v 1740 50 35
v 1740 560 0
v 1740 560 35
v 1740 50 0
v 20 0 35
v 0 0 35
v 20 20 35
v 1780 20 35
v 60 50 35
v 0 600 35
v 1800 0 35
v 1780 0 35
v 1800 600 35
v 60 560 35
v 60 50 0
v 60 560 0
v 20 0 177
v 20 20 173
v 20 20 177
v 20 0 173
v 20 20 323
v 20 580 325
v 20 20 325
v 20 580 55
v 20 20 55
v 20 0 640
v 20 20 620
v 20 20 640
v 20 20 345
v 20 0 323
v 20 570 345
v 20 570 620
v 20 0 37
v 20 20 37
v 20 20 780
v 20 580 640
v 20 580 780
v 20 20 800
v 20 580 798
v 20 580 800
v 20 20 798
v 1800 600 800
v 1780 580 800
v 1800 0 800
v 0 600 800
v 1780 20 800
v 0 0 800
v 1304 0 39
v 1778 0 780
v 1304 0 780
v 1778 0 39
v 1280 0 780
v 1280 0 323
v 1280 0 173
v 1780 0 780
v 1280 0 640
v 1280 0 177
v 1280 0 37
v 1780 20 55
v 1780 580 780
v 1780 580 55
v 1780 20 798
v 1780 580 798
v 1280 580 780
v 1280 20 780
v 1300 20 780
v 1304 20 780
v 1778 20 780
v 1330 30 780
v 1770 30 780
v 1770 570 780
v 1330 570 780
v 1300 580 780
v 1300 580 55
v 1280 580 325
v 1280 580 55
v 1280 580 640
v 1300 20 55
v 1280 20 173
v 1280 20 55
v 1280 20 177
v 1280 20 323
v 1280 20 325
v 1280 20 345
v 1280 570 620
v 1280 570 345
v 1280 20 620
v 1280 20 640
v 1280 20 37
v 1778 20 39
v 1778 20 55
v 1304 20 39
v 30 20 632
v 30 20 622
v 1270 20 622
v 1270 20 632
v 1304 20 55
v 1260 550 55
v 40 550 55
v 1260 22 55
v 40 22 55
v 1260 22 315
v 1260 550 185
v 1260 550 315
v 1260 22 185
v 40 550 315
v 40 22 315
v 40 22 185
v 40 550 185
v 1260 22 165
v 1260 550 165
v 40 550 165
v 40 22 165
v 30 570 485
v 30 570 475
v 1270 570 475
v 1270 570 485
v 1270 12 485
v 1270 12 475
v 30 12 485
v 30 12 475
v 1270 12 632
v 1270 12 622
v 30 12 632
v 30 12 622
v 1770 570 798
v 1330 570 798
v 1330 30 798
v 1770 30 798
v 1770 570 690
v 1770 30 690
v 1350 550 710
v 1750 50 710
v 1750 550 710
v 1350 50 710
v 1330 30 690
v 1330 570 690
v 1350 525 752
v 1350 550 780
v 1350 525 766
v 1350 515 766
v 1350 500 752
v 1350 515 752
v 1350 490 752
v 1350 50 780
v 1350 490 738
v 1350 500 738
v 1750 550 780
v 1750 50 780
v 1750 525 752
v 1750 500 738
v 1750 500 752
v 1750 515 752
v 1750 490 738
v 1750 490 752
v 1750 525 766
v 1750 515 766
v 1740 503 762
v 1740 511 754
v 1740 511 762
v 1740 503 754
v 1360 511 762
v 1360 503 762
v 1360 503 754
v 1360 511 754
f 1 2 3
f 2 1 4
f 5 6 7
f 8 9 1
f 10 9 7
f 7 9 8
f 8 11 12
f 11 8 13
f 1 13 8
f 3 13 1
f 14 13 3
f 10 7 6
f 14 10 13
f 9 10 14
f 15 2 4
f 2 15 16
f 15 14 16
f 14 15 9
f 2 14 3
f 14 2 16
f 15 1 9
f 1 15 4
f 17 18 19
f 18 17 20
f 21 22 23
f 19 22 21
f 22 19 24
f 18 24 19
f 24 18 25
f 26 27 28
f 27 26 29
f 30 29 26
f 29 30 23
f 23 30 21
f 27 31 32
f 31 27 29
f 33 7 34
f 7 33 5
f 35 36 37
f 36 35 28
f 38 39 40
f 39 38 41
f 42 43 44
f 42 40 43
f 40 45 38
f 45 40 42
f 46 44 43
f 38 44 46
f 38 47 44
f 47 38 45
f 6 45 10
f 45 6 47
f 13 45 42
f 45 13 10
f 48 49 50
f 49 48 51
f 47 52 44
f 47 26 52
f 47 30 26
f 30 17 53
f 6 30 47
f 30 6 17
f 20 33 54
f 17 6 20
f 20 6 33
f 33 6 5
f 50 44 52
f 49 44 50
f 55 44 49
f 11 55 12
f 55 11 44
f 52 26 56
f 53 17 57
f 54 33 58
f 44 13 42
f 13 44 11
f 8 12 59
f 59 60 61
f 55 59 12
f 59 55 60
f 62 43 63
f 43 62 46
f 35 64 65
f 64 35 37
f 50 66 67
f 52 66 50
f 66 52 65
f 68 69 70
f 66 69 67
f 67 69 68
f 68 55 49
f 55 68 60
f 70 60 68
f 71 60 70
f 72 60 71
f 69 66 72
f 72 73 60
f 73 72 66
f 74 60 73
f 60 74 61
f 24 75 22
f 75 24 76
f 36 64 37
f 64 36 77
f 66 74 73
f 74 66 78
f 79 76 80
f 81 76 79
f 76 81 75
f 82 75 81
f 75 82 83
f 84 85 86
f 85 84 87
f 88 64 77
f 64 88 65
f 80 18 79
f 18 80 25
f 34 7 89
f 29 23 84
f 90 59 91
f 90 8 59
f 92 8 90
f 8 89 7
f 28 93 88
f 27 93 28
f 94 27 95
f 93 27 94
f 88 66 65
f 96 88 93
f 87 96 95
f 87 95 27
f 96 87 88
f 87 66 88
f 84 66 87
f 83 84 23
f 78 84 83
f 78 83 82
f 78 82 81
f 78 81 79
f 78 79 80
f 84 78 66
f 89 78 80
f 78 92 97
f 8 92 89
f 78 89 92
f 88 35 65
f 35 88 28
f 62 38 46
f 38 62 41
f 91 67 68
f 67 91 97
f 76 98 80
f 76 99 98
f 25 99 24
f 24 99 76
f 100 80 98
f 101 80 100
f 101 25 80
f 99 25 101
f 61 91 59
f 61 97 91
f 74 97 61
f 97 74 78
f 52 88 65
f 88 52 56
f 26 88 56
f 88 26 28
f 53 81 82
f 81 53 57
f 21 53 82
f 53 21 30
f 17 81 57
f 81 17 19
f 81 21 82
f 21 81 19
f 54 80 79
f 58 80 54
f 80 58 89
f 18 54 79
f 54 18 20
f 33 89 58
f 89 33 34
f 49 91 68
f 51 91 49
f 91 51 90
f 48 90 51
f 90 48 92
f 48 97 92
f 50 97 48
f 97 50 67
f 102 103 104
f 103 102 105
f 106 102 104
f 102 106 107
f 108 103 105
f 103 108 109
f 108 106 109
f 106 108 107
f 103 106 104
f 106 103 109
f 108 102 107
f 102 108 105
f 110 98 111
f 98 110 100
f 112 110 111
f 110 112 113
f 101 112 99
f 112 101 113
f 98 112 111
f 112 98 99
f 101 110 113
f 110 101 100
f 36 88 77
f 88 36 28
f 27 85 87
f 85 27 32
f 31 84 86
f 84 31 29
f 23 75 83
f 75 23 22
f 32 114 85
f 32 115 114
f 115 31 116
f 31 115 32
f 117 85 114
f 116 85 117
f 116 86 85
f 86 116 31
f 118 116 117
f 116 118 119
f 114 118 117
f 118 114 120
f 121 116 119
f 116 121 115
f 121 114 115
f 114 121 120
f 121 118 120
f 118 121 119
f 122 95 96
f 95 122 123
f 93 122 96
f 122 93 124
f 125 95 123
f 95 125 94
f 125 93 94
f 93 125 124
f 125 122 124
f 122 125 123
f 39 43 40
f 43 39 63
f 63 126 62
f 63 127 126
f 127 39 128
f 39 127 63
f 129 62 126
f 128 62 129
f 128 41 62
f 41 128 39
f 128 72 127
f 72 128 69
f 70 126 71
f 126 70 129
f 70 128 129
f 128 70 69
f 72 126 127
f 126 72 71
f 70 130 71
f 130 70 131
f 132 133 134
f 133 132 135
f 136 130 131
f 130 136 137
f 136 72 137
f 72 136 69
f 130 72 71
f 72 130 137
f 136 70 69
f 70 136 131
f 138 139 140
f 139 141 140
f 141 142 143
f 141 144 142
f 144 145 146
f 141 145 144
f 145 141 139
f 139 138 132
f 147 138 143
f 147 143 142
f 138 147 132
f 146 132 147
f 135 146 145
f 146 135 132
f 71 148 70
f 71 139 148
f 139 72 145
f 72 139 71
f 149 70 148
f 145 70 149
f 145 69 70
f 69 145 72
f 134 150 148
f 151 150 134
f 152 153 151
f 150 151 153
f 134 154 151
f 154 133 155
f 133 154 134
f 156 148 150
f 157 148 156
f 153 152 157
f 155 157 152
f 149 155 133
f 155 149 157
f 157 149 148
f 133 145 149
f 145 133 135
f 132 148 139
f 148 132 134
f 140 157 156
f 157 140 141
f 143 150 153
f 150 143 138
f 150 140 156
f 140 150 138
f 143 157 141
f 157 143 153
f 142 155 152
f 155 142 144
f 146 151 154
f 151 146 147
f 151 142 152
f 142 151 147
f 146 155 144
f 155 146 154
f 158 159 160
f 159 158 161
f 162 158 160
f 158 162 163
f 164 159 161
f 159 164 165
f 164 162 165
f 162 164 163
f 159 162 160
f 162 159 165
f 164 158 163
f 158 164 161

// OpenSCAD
// Parametric 1:1 cabinet model. All dimensions are millimetres.
// X = width, Y = depth (front at 0), Z = height.
$fn = 32;
W = 1800; D = 600; H = 800;
MAIN_W = 1300; RIGHT_W = 500; PANEL = 20; PLINTH_H = 35;
CAVITY_W = 440; CAVITY_D = 540; CAVITY_INSET = 30;

module cabinet_part(pos, size, rgba) {
    color(rgba) translate(pos) cube(size, center=false);
}

union() {
    // plinth
    cabinet_part([60.000, 50.000, 0.000], [1680.000, 510.000, 35.000], [0.3000, 0.1550, 0.0900, 1.0000]);
    // left_side_panel
    cabinet_part([0.000, 0.000, 35.000], [20.000, 600.000, 765.000], [0.4000, 0.2350, 0.1450, 1.0000]);
    // right_side_panel
    cabinet_part([1780.000, 0.000, 35.000], [20.000, 600.000, 765.000], [0.4000, 0.2350, 0.1450, 1.0000]);
    // rear_panel
    cabinet_part([20.000, 580.000, 35.000], [1760.000, 20.000, 745.000], [0.1800, 0.0850, 0.0450, 1.0000]);
    // module_divider
    cabinet_part([1280.000, 20.000, 35.000], [20.000, 560.000, 745.000], [0.3000, 0.1550, 0.0900, 1.0000]);
    // main_bottom_panel
    cabinet_part([20.000, 20.000, 35.000], [1260.000, 560.000, 20.000], [0.3000, 0.1550, 0.0900, 1.0000]);
    // right_bottom_panel
    cabinet_part([1300.000, 20.000, 35.000], [480.000, 560.000, 20.000], [0.3000, 0.1550, 0.0900, 1.0000]);
    // upper_front_panel
    cabinet_part([20.000, 0.000, 640.000], [1260.000, 20.000, 160.000], [0.4000, 0.2350, 0.1450, 1.0000]);
    // upper_drawer_front
    cabinet_part([20.000, 0.000, 177.000], [1260.000, 20.000, 146.000], [0.4000, 0.2350, 0.1450, 1.0000]);
    // lower_drawer_front
    cabinet_part([20.000, 0.000, 37.000], [1260.000, 20.000, 136.000], [0.4000, 0.2350, 0.1450, 1.0000]);
    // right_full_height_door
    cabinet_part([1304.000, 0.000, 39.000], [474.000, 20.000, 757.000], [0.4000, 0.2350, 0.1450, 1.0000]);
    // upper_drawer_box
    cabinet_part([40.000, 22.000, 185.000], [1220.000, 528.000, 130.000], [0.1800, 0.0850, 0.0450, 1.0000]);
    // lower_drawer_box
    cabinet_part([40.000, 22.000, 45.000], [1220.000, 528.000, 120.000], [0.1800, 0.0850, 0.0450, 1.0000]);
    // niche_ceiling
    cabinet_part([20.000, 20.000, 620.000], [1260.000, 560.000, 20.000], [0.3600, 0.2050, 0.1250, 1.0000]);
    // niche_floor
    cabinet_part([20.000, 20.000, 325.000], [1260.000, 560.000, 20.000], [0.3600, 0.2050, 0.1250, 1.0000]);
    // niche_back_lining
    cabinet_part([20.000, 570.000, 325.000], [1260.000, 10.000, 315.000], [0.3600, 0.2050, 0.1250, 1.0000]);
    // niche_shelf
    cabinet_part([30.000, 18.000, 475.000], [1240.000, 552.000, 10.000], [0.3600, 0.2050, 0.1250, 1.0000]);
    // niche_shelf_front_edge
    cabinet_part([30.000, 12.000, 475.000], [1240.000, 10.000, 10.000], [0.5900, 0.3550, 0.2050, 1.0000]);
    // niche_upper_trim
    cabinet_part([30.000, 12.000, 622.000], [1240.000, 12.000, 10.000], [0.5900, 0.3550, 0.2050, 1.0000]);
    // niche_light_strip
    cabinet_part([40.000, 20.000, 624.000], [1220.000, 6.000, 5.000], [1.0000, 0.8000, 0.4800, 1.0000]);
    // top_front_rim
    cabinet_part([0.000, 0.000, 780.000], [1800.000, 20.000, 20.000], [0.3000, 0.1550, 0.0900, 1.0000]);
    // top_back_rim
    cabinet_part([0.000, 580.000, 780.000], [1800.000, 20.000, 20.000], [0.3000, 0.1550, 0.0900, 1.0000]);
    // top_left_rim
    cabinet_part([0.000, 20.000, 780.000], [20.000, 560.000, 20.000], [0.3000, 0.1550, 0.0900, 1.0000]);
    // top_right_rim
    cabinet_part([1780.000, 20.000, 780.000], [20.000, 560.000, 20.000], [0.3000, 0.1550, 0.0900, 1.0000]);
    // main_top_surface
    cabinet_part([20.000, 20.000, 780.000], [1280.000, 560.000, 18.000], [0.4000, 0.2350, 0.1450, 1.0000]);
    // cavity_left_rim
    cabinet_part([1300.000, 20.000, 780.000], [30.000, 560.000, 18.000], [0.4000, 0.2350, 0.1450, 1.0000]);
    // cavity_right_rim
    cabinet_part([1770.000, 20.000, 780.000], [10.000, 560.000, 18.000], [0.4000, 0.2350, 0.1450, 1.0000]);
    // cavity_front_rim
    cabinet_part([1330.000, 20.000, 780.000], [440.000, 10.000, 18.000], [0.4000, 0.2350, 0.1450, 1.0000]);
    // cavity_back_rim
    cabinet_part([1330.000, 570.000, 780.000], [440.000, 10.000, 18.000], [0.4000, 0.2350, 0.1450, 1.0000]);
    // cavity_floor
    cabinet_part([1330.000, 30.000, 690.000], [440.000, 540.000, 20.000], [0.3600, 0.2050, 0.1250, 1.0000]);
    // cavity_left_wall
    cabinet_part([1330.000, 30.000, 710.000], [20.000, 540.000, 70.000], [0.3600, 0.2050, 0.1250, 1.0000]);
    // cavity_right_wall
    cabinet_part([1750.000, 30.000, 710.000], [20.000, 540.000, 70.000], [0.3600, 0.2050, 0.1250, 1.0000]);
    // cavity_front_wall
    cabinet_part([1350.000, 30.000, 710.000], [400.000, 20.000, 70.000], [0.3600, 0.2050, 0.1250, 1.0000]);
    // cavity_back_wall
    cabinet_part([1350.000, 550.000, 710.000], [400.000, 20.000, 70.000], [0.3600, 0.2050, 0.1250, 1.0000]);
    // cavity_rear_rail
    cabinet_part([1350.000, 515.000, 752.000], [400.000, 10.000, 14.000], [0.5900, 0.3550, 0.2050, 1.0000]);
    // cavity_inner_rail
    cabinet_part([1350.000, 490.000, 738.000], [400.000, 10.000, 14.000], [0.5900, 0.3550, 0.2050, 1.0000]);
    // cavity_light_bar
    cabinet_part([1360.000, 503.000, 754.000], [380.000, 8.000, 8.000], [1.0000, 0.8000, 0.4800, 1.0000]);
}
